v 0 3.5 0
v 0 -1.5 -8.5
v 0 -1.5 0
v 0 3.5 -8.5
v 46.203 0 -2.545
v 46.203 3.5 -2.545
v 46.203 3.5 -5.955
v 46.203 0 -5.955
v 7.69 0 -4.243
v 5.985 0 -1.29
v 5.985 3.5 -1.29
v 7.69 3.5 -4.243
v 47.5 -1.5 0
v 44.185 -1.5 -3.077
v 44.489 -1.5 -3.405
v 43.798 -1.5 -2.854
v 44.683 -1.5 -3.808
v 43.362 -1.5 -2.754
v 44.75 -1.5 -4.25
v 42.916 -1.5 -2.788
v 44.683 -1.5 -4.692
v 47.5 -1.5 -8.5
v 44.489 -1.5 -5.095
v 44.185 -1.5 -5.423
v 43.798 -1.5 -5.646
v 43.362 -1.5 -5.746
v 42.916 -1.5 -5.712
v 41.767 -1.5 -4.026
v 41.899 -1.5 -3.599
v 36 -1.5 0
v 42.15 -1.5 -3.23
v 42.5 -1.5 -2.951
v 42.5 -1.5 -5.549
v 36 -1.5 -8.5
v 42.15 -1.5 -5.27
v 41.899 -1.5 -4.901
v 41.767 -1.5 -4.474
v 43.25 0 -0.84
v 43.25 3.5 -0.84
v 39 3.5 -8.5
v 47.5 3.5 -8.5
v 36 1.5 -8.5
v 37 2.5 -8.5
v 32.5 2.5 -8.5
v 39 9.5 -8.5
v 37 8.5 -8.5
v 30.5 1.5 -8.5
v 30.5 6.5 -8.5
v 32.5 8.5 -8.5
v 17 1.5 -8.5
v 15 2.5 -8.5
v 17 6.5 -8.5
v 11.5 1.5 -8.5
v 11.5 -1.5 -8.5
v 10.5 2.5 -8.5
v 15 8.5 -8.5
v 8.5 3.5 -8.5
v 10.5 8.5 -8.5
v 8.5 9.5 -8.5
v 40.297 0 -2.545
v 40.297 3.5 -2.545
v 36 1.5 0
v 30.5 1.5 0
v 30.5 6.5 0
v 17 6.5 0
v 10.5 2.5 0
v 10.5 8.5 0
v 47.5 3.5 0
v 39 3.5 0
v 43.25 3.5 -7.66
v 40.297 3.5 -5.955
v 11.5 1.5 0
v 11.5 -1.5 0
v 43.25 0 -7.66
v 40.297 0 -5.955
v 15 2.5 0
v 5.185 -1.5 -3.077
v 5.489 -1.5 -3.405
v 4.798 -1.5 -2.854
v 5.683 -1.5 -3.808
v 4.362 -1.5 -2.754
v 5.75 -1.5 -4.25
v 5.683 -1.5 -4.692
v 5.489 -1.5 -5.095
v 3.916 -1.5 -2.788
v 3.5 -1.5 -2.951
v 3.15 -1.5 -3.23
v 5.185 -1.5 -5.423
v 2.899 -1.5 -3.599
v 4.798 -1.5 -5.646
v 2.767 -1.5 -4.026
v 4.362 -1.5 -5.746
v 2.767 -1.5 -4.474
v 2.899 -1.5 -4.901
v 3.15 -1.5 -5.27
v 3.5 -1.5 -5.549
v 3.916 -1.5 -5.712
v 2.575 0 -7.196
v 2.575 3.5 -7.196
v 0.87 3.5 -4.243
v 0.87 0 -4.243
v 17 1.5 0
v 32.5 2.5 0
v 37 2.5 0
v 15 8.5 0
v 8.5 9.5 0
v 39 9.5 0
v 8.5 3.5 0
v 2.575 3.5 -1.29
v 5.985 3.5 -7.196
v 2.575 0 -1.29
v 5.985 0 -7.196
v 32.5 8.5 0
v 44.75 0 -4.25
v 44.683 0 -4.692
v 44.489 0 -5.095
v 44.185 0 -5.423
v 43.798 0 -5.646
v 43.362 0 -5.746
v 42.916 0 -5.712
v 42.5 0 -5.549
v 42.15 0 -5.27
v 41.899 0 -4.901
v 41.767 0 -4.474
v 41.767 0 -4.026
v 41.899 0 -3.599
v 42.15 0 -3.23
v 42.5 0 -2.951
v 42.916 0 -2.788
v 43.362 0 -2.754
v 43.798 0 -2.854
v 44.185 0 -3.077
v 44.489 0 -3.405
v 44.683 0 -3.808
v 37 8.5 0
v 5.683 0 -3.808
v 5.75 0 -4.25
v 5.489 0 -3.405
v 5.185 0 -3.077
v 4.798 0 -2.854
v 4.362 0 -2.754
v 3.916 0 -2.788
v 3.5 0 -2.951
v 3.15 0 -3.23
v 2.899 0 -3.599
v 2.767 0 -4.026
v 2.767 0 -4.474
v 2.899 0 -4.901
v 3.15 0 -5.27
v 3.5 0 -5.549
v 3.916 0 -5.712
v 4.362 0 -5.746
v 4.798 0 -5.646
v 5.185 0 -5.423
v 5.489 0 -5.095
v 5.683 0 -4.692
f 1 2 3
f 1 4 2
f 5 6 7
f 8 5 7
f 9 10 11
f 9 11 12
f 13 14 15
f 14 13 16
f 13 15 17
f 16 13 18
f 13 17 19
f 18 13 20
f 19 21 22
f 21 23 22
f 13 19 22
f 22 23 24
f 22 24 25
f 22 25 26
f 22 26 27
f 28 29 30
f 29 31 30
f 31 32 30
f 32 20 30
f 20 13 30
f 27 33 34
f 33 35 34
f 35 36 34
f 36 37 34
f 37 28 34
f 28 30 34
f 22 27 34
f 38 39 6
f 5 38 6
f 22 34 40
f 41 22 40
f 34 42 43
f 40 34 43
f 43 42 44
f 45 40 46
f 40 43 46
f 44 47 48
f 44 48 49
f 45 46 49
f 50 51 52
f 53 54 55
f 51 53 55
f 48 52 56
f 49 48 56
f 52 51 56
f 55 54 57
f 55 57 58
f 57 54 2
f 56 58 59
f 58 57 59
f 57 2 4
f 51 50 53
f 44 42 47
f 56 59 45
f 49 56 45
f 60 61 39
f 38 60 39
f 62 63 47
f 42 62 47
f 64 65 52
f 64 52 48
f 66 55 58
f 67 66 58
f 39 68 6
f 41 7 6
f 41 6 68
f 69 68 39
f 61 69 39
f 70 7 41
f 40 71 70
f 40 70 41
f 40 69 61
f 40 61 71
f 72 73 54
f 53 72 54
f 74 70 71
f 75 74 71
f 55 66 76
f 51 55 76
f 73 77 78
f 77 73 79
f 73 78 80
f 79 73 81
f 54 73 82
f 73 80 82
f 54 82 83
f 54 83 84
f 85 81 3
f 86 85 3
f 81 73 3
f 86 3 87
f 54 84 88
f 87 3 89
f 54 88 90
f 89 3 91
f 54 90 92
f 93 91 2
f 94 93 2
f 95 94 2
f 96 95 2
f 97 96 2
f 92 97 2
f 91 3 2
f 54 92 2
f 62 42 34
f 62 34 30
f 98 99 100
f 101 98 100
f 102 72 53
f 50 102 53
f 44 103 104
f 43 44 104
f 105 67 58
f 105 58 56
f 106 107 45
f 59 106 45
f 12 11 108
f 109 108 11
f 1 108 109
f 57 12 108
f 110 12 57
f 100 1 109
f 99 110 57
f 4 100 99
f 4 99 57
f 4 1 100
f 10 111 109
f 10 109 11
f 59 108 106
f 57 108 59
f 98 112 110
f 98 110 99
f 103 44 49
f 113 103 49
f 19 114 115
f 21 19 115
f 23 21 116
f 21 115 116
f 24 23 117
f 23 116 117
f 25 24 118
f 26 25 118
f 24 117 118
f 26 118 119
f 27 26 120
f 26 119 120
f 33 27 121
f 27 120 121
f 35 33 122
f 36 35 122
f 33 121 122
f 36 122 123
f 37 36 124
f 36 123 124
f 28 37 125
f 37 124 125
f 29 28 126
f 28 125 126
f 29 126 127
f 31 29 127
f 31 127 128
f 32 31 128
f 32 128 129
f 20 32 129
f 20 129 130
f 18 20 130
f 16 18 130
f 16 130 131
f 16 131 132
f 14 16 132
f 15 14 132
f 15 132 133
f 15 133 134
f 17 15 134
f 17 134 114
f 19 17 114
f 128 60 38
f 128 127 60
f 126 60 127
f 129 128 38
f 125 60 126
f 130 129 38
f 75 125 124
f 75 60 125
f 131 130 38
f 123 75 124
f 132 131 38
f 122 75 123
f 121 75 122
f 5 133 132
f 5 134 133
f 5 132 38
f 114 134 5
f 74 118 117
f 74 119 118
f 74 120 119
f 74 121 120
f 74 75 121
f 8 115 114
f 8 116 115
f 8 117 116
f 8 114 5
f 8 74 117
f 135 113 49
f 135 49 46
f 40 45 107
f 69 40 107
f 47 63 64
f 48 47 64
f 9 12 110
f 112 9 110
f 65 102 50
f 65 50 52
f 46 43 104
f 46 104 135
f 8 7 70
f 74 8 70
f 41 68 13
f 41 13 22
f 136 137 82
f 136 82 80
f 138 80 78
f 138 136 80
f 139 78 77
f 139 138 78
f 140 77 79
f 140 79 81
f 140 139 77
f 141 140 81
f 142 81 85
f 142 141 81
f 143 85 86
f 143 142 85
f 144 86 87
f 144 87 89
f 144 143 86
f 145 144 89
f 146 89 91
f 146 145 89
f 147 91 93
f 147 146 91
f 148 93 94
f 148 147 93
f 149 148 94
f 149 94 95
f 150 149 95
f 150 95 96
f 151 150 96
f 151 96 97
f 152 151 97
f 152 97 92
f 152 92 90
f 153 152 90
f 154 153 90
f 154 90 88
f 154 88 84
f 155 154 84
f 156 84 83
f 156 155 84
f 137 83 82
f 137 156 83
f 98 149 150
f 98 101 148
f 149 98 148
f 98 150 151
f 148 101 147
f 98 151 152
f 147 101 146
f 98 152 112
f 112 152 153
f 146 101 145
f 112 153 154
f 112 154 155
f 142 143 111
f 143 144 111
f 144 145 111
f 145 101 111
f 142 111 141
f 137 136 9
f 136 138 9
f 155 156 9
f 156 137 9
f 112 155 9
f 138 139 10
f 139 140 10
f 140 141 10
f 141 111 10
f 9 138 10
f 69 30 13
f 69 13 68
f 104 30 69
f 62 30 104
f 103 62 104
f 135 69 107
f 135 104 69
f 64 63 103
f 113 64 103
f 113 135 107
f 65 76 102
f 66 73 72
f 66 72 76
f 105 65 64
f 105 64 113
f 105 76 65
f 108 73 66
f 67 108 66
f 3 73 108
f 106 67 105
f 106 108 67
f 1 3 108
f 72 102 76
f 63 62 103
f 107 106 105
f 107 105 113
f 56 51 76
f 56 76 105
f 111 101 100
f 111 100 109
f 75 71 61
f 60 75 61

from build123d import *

# Parameters (mm, degrees)
SKETCH1_W           = 8.5
SKETCH1_H           = 8.5
BOSS_EXTRUDE1_DEPTH = 3.5
SKETCH2_W           = 8.5
SKETCH2_H           = 8.5
SKETCH2_R           = 1.5
BOSS_EXTRUDE2_DEPTH = 1.5
SKETCH3_W           = 8.5
SKETCH3_H           = 5
BOSS_EXTRUDE3_DEPTH = 3
SKETCH4_W           = 3
SKETCH4_H           = 8.5
BOSS_EXTRUDE4_DEPTH = 6
SKETCH5_W           = 8.5
SKETCH5_H           = 3
BOSS_EXTRUDE5_DEPTH = 27.5
SKETCH6_W           = 3
SKETCH6_H           = 8.5
BOSS_EXTRUDE6_DEPTH = 8
SKETCH7_W           = 8.5
SKETCH7_H           = 5
BOSS_EXTRUDE7_DEPTH = 8.5
CUT_EXTRUDE1_DEPTH  = 3.5
SKETCH10_R          = 1.5
CUT_EXTRUDE3_DEPTH  = 3.5
BOSS_EXTRUDE8_REACH = 38
SKETCH15_W          = 8.5
SKETCH15_H          = 5
SKETCH16_W          = 4.5
SKETCH16_H          = 6
CUT_EXTRUDE4_DEPTH  = 10
SKETCH17_W          = 13.5
SKETCH17_H          = 5
CUT_EXTRUDE5_DEPTH  = 10


with BuildPart() as part:
    # Sketch1 → Boss-Extrude1 (new body)
    with BuildSketch(Plane(origin=(0, 0, 0), x_dir=(1, 0, 0), z_dir=(0, 1, 0))):
        with Locations((4.25, 4.25)):
            Rectangle(SKETCH1_W, SKETCH1_H)
        Polygon((5.985496764, 7.195964334), (2.575496764, 7.195964334), (0.870496764, 4.242817707), (2.575496764, 1.28967108), (5.985496764, 1.28967108), (7.690496764, 4.242817707), align=None, mode=Mode.SUBTRACT)
    extrude(amount=BOSS_EXTRUDE1_DEPTH)

    # Sketch2 → Boss-Extrude2 (add)
    with BuildSketch(Plane.XZ):
        with Locations((4.25, -4.25)):
            Rectangle(SKETCH2_W, SKETCH2_H)
        with Locations((4.25, -4.25)):
            Circle(SKETCH2_R, mode=Mode.SUBTRACT)
    extrude(amount=BOSS_EXTRUDE2_DEPTH)

    # Sketch3 → Boss-Extrude3 (add)
    with BuildSketch(Plane(origin=(8.5, 0, 0), x_dir=(0, 0, -1), z_dir=(1, 0, 0))):
        with Locations((4.25, 1)):
            Rectangle(SKETCH3_W, SKETCH3_H)
    extrude(amount=BOSS_EXTRUDE3_DEPTH)

    # Sketch4 → Boss-Extrude4 (add)
    with BuildSketch(Plane(origin=(0, 3.5, 0), x_dir=(1, 0, 0), z_dir=(0, 1, 0))):
        with Locations((10, 4.25)):
            Rectangle(SKETCH4_W, SKETCH4_H)
    extrude(amount=BOSS_EXTRUDE4_DEPTH)

    # Sketch5 → Boss-Extrude5 (add)
    with BuildSketch(Plane(origin=(11.5, 0, 0), x_dir=(0, 0, -1), z_dir=(1, 0, 0))):
        with Locations((4.25, 8)):
            Rectangle(SKETCH5_W, SKETCH5_H)
    extrude(amount=BOSS_EXTRUDE5_DEPTH)

    # Sketch6 → Boss-Extrude6 (add)
    with BuildSketch(Plane.XZ.offset(-6.5)):
        with Locations((37.5, -4.25)):
            Rectangle(SKETCH6_W, SKETCH6_H)
    extrude(amount=BOSS_EXTRUDE6_DEPTH)

    # Sketch7 → Boss-Extrude7 (add)
    with BuildSketch(Plane(origin=(39, 0, 0), x_dir=(0, 0, -1), z_dir=(1, 0, 0))):
        with Locations((4.25, 1)):
            Rectangle(SKETCH7_W, SKETCH7_H)
    extrude(amount=BOSS_EXTRUDE7_DEPTH)

    # Sketch8 → Cut-Extrude1 (cut)
    with BuildSketch(Plane(origin=(0, 3.5, 0), x_dir=(1, 0, 0), z_dir=(0, 1, 0))):
        Polygon((46.203146627, 5.955), (43.25, 7.66), (40.296853373, 5.955), (40.296853373, 2.545), (43.25, 0.84), (46.203146627, 2.545), align=None)
    extrude(amount=-CUT_EXTRUDE1_DEPTH, mode=Mode.SUBTRACT)

    # Sketch10 → Cut-Extrude3 (cut)
    with BuildSketch(Plane(origin=(0, 0, 0), x_dir=(1, 0, 0), z_dir=(0, 1, 0))):
        with Locations((43.25, 4.25)):
            Circle(SKETCH10_R)
    extrude(amount=-CUT_EXTRUDE3_DEPTH, mode=Mode.SUBTRACT)

    # Sketch15 → Boss-Extrude8 (add, up to next)
    with BuildSketch(Plane(origin=(11.5, 0, 0), x_dir=(0, 0, -1), z_dir=(1, 0, 0)), mode=Mode.PRIVATE) as boss_extrude8_sk1:
        with Locations((4.25, 4)):
            Rectangle(SKETCH15_W, SKETCH15_H)
    boss_extrude8_tool1 = extrude(boss_extrude8_sk1.sketch, amount=BOSS_EXTRUDE8_REACH, mode=Mode.PRIVATE) - part.part
    add(boss_extrude8_tool1.solids().sort_by_distance((11.5, 4, -4.25))[0])

    # Sketch16 → Cut-Extrude4 (cut)
    with BuildSketch(Plane.XY):
        with Locations((12.75, 5.5)):
            Rectangle(SKETCH16_W, SKETCH16_H)
        with Locations((34.75, 5.5)):
            Rectangle(SKETCH16_W, SKETCH16_H)
    extrude(amount=-CUT_EXTRUDE4_DEPTH, mode=Mode.SUBTRACT)

    # Sketch17 → Cut-Extrude5 (cut)
    with BuildSketch(Plane.XY):
        with Locations((23.75, 4)):
            Rectangle(SKETCH17_W, SKETCH17_H)
    extrude(amount=-CUT_EXTRUDE5_DEPTH, mode=Mode.SUBTRACT)


solid = part.part
